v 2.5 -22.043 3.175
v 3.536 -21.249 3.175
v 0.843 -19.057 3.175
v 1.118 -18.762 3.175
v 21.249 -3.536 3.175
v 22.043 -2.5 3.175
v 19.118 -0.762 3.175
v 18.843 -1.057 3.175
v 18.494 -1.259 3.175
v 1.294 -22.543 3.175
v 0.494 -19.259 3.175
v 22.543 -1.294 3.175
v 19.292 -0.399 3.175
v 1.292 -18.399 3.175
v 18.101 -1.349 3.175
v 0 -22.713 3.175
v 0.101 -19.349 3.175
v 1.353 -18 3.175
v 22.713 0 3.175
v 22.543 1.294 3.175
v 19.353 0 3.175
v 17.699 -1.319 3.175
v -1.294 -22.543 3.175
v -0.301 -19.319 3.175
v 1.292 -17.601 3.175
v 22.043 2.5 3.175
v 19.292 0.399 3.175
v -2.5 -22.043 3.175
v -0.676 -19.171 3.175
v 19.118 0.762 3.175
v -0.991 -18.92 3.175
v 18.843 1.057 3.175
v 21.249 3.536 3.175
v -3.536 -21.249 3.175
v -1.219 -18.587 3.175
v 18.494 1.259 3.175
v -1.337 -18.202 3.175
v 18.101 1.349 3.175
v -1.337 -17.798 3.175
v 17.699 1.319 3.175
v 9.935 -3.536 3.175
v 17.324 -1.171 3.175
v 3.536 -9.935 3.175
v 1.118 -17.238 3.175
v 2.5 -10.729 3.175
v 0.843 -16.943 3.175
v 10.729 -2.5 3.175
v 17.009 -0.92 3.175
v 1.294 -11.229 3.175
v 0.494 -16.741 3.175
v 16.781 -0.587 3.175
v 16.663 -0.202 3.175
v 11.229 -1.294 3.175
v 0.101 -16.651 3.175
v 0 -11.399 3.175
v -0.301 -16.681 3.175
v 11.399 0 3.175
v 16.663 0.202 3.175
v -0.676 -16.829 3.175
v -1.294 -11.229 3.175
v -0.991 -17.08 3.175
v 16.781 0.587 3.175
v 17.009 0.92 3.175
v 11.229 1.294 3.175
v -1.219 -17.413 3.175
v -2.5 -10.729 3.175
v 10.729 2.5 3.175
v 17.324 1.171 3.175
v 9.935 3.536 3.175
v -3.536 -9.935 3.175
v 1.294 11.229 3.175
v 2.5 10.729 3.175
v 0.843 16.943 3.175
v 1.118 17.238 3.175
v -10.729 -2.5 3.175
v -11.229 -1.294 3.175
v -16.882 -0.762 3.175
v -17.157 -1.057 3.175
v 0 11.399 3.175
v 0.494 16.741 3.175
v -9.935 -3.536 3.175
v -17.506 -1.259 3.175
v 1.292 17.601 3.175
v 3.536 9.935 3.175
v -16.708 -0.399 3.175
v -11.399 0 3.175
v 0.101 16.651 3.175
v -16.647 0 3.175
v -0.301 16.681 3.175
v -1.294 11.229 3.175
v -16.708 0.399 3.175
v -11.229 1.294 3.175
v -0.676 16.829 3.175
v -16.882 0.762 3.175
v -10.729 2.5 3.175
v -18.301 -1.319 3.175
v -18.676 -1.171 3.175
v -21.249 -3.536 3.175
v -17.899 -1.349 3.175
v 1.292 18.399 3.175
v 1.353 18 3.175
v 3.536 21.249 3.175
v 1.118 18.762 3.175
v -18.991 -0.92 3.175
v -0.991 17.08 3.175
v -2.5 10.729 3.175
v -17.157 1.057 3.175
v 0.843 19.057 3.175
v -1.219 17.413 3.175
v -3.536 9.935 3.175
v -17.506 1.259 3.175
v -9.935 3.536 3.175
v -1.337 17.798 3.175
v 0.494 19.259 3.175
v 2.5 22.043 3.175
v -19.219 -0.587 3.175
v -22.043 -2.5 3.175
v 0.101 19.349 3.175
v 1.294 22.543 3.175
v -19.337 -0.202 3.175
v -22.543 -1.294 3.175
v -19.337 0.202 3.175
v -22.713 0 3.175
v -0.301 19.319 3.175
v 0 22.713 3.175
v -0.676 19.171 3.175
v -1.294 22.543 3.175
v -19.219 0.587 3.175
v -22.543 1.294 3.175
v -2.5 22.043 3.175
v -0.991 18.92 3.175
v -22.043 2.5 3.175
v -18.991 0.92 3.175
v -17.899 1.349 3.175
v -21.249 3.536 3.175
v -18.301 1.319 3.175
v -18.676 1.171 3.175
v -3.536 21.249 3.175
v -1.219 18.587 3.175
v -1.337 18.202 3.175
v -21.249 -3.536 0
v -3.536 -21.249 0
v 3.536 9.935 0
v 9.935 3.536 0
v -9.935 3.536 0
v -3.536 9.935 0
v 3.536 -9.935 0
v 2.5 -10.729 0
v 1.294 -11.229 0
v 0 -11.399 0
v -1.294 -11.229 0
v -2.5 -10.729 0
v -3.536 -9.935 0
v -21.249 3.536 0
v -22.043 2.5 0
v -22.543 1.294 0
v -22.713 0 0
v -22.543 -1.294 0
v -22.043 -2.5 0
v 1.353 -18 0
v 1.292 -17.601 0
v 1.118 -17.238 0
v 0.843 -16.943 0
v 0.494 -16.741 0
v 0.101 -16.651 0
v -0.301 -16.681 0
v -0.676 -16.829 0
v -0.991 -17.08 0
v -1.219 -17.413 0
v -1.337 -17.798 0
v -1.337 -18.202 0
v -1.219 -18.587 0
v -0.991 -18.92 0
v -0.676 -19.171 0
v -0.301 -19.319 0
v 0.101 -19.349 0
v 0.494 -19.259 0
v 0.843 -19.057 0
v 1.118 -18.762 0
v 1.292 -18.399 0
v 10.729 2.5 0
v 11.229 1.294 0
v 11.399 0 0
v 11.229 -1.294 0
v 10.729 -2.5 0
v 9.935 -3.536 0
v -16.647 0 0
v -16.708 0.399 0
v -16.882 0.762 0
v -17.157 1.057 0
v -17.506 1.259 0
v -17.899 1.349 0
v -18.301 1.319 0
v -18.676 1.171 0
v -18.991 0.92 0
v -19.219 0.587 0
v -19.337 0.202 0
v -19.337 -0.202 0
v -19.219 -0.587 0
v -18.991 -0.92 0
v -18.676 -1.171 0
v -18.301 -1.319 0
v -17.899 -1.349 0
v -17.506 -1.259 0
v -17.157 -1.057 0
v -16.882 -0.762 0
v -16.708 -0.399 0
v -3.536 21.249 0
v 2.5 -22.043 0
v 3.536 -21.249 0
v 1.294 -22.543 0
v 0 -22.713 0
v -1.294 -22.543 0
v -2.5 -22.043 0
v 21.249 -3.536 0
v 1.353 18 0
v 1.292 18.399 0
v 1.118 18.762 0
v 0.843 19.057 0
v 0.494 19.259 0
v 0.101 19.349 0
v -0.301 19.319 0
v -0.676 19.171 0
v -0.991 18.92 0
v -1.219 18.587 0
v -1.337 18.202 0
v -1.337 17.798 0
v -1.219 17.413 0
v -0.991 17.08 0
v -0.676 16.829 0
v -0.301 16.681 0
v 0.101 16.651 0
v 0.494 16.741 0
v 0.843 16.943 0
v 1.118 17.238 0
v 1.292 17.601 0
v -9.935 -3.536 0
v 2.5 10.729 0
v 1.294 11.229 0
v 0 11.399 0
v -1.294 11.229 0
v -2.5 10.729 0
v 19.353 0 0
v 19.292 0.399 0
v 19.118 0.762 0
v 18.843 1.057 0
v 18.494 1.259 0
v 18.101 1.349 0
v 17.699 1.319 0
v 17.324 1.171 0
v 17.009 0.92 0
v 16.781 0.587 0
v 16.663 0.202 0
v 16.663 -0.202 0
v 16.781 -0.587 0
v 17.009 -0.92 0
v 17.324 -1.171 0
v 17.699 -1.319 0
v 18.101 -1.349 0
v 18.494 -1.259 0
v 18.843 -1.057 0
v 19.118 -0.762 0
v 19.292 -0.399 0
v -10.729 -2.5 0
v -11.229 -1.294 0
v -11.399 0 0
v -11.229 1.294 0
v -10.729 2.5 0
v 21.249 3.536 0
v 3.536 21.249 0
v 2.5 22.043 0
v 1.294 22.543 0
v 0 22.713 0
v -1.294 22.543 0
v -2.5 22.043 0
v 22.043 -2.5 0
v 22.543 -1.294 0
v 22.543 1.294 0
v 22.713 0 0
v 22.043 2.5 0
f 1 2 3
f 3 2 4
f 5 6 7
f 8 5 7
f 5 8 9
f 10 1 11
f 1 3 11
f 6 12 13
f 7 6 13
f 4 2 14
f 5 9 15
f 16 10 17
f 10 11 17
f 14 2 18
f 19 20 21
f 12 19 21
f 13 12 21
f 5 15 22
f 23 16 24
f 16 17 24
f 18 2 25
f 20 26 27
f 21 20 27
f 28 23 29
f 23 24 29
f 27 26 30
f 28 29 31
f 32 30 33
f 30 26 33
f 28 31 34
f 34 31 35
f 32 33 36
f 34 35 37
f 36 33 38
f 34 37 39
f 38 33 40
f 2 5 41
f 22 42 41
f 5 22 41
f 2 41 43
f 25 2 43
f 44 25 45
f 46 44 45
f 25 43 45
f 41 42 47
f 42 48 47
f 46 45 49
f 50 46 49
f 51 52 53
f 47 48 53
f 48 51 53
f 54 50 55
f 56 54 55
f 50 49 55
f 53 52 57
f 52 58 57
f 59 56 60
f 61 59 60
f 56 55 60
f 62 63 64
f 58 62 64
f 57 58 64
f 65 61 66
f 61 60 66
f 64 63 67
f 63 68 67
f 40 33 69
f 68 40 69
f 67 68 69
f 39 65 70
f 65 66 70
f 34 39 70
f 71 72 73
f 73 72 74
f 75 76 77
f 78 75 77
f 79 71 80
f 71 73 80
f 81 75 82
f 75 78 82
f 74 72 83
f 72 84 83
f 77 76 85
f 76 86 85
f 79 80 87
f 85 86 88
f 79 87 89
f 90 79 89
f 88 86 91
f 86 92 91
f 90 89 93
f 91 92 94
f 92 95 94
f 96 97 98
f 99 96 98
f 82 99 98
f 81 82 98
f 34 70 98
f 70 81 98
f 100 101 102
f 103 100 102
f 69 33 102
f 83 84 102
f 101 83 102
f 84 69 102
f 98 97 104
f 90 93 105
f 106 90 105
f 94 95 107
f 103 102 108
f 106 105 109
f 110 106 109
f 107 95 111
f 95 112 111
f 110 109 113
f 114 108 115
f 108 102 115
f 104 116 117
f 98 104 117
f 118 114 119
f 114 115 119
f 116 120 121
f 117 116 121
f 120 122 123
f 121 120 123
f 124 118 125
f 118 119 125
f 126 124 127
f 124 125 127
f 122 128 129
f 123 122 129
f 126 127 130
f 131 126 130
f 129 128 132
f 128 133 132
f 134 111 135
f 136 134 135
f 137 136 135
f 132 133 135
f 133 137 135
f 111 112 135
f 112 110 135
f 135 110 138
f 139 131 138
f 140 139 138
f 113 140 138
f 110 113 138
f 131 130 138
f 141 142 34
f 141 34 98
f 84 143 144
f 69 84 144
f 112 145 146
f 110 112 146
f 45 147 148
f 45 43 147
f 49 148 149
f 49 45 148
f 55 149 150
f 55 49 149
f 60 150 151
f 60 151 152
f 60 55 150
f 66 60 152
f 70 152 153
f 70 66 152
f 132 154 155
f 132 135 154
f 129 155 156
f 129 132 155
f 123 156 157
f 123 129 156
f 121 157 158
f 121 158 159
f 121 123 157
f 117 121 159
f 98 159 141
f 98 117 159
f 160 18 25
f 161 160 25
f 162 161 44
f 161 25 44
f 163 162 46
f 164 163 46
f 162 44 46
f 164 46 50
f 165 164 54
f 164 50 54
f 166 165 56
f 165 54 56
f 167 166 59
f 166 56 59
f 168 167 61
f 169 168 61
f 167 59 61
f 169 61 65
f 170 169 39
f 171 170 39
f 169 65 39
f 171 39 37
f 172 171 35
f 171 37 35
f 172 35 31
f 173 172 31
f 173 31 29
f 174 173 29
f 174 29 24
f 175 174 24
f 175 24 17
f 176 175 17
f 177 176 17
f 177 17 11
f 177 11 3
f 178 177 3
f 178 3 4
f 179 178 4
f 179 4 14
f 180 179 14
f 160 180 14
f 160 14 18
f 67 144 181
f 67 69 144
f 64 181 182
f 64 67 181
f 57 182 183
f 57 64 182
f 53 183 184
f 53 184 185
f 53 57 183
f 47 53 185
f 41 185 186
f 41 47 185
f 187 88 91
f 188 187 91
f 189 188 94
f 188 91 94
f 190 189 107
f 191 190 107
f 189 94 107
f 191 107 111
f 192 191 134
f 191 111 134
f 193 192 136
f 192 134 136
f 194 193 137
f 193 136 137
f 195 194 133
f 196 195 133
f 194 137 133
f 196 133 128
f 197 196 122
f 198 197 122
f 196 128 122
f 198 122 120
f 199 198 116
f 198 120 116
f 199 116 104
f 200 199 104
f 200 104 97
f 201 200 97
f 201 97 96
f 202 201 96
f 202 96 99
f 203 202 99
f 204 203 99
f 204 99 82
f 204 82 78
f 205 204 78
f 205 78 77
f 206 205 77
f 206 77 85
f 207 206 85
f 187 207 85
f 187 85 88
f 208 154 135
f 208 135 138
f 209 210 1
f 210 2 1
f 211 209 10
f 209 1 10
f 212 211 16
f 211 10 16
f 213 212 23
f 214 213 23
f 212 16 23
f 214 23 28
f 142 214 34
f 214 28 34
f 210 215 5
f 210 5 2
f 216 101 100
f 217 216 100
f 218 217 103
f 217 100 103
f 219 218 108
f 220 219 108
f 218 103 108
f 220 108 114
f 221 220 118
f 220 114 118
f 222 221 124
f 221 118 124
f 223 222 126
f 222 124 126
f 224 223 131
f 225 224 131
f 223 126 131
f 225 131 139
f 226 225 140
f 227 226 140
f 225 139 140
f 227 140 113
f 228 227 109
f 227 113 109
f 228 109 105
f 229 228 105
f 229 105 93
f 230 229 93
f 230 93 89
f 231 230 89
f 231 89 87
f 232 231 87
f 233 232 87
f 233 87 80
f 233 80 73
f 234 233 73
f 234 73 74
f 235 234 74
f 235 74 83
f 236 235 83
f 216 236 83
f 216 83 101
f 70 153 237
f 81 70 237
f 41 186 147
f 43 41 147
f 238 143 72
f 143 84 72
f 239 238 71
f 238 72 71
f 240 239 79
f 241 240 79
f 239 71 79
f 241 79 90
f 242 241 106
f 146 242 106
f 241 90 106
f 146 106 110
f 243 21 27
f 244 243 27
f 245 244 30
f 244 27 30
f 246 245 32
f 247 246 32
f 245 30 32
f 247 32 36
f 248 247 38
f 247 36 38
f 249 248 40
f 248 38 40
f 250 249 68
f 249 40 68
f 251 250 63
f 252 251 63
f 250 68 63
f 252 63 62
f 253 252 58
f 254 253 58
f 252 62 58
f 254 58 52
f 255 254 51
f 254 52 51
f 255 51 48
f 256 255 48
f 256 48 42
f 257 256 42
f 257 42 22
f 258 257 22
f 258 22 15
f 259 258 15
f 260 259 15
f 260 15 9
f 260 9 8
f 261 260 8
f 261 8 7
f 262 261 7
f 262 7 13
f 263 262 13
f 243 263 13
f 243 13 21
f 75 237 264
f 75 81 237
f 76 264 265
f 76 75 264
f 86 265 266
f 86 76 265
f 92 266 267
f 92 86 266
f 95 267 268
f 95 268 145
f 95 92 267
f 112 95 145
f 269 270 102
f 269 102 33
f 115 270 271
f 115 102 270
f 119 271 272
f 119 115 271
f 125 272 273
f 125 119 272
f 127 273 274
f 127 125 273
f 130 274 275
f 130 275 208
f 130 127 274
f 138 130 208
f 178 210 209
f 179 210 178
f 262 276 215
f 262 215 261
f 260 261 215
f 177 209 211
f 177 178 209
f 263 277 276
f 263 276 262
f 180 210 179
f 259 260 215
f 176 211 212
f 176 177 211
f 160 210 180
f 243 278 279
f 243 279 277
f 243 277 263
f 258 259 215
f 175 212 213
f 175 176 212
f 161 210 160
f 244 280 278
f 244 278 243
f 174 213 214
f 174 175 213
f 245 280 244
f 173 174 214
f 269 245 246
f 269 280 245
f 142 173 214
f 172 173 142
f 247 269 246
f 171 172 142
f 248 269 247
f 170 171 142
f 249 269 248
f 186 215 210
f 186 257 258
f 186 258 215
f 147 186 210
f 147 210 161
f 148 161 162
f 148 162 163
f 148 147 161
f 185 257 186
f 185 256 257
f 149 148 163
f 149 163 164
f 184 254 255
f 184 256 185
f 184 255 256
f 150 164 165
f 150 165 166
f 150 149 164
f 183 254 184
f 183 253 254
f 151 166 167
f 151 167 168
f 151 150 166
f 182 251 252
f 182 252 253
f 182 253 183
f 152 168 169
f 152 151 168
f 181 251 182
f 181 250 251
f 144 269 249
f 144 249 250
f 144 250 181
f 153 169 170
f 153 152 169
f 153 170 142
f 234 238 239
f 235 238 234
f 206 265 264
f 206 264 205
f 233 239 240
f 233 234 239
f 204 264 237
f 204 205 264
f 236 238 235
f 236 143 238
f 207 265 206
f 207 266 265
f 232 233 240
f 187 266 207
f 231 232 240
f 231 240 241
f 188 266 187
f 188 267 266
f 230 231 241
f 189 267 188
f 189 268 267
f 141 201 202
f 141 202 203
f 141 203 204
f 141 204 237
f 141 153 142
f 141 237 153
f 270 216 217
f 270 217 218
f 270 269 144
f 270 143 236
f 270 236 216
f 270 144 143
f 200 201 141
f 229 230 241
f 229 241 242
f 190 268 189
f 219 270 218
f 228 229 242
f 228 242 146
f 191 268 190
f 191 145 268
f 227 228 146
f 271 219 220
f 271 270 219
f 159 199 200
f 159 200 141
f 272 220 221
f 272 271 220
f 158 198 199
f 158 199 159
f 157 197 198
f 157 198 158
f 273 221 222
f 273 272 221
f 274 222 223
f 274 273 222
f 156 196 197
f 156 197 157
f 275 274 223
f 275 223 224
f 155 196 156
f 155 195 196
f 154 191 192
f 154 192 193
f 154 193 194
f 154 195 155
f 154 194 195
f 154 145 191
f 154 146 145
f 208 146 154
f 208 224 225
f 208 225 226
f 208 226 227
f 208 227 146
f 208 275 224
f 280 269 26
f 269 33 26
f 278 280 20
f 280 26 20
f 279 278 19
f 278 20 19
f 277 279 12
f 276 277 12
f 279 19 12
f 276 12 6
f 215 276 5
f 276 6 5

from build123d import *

# Parameters (mm, degrees)
BOSS_EXTRUDE1_DEPTH       = 3.175
FILLET1_R                 = 5
F_6_32_TAPPED_HOLE1_D     = 2.7051
F_6_32_TAPPED_HOLE1_DEPTH = 10.973
F_6_32_TAPPED_HOLE1_TIP   = 0.81269403
FILLET2_R                 = 5


with BuildPart() as part:
    # Sketch2 → Boss-Extrude1 (new body)
    with BuildSketch(Plane.XY):
        Polygon((0, 24.784092681), (24.784092681, 0), (0, -24.784092681), (-24.784092681, 0), align=None)
        Polygon((0, 13.470384182), (13.470384182, 0), (0, -13.470384182), (-13.470384182, 0), align=None, mode=Mode.SUBTRACT)
    extrude(amount=BOSS_EXTRUDE1_DEPTH)

    # Fillet1
    fillet1_edges = [part.edges().sort_by_distance(p)[0] for p in [
        (0, 13.470384182, 1.5875),
        (-13.470384182, 0, 1.5875),
        (0, -13.470384182, 1.5875),
        (13.470384182, 0, 1.5875),
    ]]
    fillet(fillet1_edges, radius=FILLET1_R)

    # #6-32 Tapped Hole1
    with Locations(Plane(origin=(0, 0, 0), x_dir=(-1, 0, 0), z_dir=(0, 0, -1))):
        with Locations((-18, 0), (0, 18), (0, -18), (18, 0)):
            Hole(F_6_32_TAPPED_HOLE1_D / 2, depth=F_6_32_TAPPED_HOLE1_DEPTH)
            with Locations((0, 0, -(F_6_32_TAPPED_HOLE1_DEPTH + F_6_32_TAPPED_HOLE1_TIP / 2))):  # 118° drill point
                Cone(0, F_6_32_TAPPED_HOLE1_D / 2, F_6_32_TAPPED_HOLE1_TIP, mode=Mode.SUBTRACT)

    # Fillet2
    fillet2_edges = [part.edges().sort_by_distance(p)[0] for p in [
        (0, 24.784092681, 1.5875),
        (24.784092681, 0, 1.5875),
        (0, -24.784092681, 1.5875),
        (-24.784092681, 0, 1.5875),
    ]]
    fillet(fillet2_edges, radius=FILLET2_R)


solid = part.part
